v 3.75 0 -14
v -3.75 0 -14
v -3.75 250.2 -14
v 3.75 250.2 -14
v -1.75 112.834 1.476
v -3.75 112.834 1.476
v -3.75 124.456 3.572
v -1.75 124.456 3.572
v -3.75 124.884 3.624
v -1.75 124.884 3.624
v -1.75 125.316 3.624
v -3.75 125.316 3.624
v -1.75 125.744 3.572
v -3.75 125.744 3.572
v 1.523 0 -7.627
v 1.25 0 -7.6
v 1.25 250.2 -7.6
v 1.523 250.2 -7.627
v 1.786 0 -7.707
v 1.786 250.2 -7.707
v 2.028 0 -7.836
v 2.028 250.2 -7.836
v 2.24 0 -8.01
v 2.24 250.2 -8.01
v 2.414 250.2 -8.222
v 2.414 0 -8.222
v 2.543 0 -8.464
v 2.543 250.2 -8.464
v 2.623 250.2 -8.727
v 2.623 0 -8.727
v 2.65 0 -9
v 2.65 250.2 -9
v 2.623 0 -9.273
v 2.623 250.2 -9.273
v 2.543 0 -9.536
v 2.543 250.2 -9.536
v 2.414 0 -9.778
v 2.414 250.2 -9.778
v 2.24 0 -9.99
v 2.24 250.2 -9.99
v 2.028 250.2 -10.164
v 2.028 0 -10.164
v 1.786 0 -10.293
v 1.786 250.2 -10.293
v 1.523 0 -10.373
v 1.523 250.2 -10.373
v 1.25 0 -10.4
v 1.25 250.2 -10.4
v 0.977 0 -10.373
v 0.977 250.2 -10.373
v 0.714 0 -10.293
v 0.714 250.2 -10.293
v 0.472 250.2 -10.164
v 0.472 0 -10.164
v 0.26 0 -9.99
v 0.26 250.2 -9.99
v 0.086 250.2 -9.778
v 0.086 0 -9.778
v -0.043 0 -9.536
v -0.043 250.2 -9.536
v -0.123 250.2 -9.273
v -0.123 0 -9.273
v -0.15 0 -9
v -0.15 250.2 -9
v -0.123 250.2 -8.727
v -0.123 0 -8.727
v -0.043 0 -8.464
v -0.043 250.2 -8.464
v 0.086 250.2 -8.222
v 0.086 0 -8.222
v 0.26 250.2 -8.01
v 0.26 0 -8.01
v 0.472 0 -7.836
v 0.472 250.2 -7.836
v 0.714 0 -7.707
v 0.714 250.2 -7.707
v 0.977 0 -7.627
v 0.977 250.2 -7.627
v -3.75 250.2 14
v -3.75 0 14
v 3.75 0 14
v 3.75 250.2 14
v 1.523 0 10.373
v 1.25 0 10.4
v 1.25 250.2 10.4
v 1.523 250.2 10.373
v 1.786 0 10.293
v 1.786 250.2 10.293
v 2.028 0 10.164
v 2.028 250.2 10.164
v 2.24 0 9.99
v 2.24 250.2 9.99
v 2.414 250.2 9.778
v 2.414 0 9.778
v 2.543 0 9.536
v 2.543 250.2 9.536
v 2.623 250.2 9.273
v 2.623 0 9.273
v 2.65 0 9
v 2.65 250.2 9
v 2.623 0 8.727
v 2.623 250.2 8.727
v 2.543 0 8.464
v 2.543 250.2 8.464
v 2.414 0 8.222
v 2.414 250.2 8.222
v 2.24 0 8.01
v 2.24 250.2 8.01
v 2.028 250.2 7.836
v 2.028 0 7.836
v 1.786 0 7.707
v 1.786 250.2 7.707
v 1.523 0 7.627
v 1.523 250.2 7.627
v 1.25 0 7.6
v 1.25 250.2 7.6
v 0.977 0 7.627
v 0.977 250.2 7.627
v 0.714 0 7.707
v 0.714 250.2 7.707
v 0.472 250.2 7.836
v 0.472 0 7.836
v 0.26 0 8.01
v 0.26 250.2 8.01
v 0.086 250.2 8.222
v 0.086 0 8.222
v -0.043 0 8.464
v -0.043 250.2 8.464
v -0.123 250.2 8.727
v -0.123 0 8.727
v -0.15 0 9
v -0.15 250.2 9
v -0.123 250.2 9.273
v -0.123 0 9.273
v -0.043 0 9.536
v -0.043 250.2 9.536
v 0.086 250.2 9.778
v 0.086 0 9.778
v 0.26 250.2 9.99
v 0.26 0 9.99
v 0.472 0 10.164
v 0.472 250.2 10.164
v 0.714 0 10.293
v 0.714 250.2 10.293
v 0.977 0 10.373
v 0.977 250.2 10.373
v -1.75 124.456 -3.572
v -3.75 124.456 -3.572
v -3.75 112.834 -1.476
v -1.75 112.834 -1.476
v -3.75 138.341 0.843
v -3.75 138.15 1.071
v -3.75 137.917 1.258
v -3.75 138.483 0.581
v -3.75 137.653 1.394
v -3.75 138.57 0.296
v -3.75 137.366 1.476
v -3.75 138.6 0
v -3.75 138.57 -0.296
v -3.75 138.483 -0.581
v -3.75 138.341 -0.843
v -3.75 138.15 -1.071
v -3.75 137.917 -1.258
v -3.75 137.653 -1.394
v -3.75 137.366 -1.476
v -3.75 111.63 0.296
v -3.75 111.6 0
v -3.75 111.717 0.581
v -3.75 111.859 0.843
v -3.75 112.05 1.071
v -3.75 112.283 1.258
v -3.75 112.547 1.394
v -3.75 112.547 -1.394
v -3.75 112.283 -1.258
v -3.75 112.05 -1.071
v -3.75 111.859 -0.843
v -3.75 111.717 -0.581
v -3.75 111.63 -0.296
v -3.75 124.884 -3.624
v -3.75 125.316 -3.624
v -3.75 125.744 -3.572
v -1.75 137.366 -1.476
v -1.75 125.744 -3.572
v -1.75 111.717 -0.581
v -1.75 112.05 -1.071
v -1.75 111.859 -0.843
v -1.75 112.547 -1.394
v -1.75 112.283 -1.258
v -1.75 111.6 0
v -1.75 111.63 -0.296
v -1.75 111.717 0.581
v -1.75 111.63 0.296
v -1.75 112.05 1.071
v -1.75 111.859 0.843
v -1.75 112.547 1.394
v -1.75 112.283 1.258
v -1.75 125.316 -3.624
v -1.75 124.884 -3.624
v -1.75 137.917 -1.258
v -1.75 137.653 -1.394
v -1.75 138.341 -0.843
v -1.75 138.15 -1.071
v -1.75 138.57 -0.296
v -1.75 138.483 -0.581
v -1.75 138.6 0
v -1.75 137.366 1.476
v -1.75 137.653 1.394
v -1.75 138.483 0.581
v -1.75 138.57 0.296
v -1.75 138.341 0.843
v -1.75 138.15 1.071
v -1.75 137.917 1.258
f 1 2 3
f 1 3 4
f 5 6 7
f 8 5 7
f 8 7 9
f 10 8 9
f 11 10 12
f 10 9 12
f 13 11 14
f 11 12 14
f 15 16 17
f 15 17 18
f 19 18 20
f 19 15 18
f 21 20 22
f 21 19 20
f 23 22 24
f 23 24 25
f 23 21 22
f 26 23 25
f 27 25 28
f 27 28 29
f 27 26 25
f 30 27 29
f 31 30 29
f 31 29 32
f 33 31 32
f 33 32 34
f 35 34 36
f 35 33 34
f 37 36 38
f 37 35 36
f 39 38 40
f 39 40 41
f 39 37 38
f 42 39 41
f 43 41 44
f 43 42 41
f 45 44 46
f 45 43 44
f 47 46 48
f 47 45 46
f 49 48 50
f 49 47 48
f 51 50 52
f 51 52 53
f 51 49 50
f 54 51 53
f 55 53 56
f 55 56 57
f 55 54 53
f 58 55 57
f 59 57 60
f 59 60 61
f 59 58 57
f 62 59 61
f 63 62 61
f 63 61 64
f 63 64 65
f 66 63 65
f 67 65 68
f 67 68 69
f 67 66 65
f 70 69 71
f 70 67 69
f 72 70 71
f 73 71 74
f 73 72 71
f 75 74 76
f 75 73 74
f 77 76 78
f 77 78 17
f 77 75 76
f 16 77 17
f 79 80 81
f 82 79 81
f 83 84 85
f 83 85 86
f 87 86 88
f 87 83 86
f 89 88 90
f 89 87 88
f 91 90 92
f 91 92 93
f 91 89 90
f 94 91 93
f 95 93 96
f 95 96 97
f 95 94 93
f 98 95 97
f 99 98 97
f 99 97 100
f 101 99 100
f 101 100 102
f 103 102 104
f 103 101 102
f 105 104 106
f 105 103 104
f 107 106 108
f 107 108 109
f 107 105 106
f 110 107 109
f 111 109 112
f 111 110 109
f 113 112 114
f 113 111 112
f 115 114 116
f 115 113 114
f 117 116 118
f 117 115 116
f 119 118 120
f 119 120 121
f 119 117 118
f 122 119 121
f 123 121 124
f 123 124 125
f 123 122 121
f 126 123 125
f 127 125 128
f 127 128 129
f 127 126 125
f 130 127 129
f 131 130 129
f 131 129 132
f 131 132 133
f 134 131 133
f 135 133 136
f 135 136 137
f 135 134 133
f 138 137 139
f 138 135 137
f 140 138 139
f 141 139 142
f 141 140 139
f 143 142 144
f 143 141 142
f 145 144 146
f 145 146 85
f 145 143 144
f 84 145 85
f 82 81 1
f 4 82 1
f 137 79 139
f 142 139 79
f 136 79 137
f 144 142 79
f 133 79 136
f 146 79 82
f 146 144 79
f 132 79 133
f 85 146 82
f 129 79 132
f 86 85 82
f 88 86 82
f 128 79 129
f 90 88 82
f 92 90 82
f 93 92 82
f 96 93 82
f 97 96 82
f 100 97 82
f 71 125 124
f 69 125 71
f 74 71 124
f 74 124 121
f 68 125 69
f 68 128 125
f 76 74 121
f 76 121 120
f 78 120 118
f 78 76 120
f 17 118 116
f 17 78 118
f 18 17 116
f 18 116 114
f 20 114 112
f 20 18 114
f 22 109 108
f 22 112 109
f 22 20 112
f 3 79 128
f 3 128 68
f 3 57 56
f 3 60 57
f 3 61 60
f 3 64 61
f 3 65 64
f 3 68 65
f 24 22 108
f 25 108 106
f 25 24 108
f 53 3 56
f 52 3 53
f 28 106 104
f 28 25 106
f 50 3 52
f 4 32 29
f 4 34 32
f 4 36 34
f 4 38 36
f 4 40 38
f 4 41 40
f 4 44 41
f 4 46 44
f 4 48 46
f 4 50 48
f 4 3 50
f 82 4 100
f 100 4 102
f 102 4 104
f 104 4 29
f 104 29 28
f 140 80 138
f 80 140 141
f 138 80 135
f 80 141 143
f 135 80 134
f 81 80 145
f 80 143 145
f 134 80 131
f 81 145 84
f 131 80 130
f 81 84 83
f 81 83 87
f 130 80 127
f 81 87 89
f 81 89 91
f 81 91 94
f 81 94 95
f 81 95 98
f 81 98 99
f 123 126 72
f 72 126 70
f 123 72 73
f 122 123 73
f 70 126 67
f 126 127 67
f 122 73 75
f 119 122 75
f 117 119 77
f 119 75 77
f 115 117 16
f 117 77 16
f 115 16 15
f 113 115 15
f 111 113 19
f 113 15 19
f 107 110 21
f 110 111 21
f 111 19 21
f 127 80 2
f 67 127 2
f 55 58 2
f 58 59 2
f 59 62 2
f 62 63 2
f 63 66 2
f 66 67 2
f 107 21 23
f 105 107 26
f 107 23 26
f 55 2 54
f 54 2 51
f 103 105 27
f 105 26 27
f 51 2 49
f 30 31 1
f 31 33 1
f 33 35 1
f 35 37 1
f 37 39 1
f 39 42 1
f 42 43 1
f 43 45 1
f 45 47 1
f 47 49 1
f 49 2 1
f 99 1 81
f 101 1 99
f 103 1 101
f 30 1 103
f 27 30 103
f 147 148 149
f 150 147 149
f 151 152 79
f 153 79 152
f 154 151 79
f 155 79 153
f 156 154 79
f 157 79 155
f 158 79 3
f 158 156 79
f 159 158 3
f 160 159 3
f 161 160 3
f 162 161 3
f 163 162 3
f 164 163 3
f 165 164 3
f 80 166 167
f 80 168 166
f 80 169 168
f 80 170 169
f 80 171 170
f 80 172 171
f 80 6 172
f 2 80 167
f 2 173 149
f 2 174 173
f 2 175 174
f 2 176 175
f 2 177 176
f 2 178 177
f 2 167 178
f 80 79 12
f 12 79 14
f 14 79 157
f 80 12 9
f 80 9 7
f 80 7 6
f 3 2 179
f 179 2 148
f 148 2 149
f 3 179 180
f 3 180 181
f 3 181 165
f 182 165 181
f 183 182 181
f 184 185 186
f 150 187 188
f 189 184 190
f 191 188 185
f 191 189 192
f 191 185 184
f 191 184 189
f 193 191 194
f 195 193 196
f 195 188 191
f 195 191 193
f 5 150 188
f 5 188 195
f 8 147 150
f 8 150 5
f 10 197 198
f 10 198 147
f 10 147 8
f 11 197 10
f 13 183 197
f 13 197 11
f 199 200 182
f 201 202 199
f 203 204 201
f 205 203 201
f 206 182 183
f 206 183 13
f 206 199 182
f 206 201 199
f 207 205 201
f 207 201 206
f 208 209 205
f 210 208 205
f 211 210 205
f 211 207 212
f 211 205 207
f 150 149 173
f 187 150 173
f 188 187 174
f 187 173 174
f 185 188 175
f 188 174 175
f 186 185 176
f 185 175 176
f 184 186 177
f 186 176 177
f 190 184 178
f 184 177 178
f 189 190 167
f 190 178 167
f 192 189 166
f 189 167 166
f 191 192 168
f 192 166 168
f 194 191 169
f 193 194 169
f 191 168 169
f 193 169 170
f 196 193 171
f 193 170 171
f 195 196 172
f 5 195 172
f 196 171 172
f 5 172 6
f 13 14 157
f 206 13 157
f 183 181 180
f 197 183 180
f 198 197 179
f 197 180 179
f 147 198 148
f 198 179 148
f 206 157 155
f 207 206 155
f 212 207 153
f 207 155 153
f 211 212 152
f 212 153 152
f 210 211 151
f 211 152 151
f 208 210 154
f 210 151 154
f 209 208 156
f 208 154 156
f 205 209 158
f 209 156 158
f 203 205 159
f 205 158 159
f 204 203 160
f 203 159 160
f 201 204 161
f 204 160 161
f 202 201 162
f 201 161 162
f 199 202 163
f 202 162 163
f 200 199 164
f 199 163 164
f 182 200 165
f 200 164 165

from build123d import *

# Parameters (mm, degrees)
SKETCH1_W           = 7.5
SKETCH1_H           = 28
SKETCH1_R           = 1.4
BOSS_EXTRUDE1_DEPTH = 250.2
CUT_EXTRUDE1_DEPTH  = 2


with BuildPart() as part:
    # Sketch1 → Boss-Extrude1 (new body)
    with BuildSketch(Plane(origin=(0, 0, 0), x_dir=(1, 0, 0), z_dir=(0, 1, 0))):
        Rectangle(SKETCH1_W, SKETCH1_H)
        with Locations(Location((1.25, -9, 0), (0, 0, 270))):
            Circle(SKETCH1_R, mode=Mode.SUBTRACT)
        with Locations(Location((1.25, 9, 0), (0, 0, 270))):
            Circle(SKETCH1_R, mode=Mode.SUBTRACT)
    extrude(amount=BOSS_EXTRUDE1_DEPTH)

    # Sketch3 → Cut-Extrude1 (cut)
    with BuildSketch(Plane.ZY.offset(3.75)):
        with BuildLine():
            Line((-1.476181201, 137.36625), (-3.572358506, 125.744325))
            ThreePointArc((-3.572358506, 125.744325), (-3.63, 125.1), (-3.572358506, 124.455675))
            Line((-3.572358506, 124.455675), (-1.476181201, 112.83375))
            ThreePointArc((-1.476181201, 112.83375), (0, 111.6), (1.476181201, 112.83375))
            Line((1.476181201, 112.83375), (3.572358506, 124.455675))
            ThreePointArc((3.572358506, 124.455675), (3.63, 125.1), (3.572358506, 125.744325))
            Line((3.572358506, 125.744325), (1.476181201, 137.36625))
            ThreePointArc((1.476181201, 137.36625), (0, 138.6), (-1.476181201, 137.36625))
        make_face()
    extrude(amount=-CUT_EXTRUDE1_DEPTH, mode=Mode.SUBTRACT)


solid = part.part
